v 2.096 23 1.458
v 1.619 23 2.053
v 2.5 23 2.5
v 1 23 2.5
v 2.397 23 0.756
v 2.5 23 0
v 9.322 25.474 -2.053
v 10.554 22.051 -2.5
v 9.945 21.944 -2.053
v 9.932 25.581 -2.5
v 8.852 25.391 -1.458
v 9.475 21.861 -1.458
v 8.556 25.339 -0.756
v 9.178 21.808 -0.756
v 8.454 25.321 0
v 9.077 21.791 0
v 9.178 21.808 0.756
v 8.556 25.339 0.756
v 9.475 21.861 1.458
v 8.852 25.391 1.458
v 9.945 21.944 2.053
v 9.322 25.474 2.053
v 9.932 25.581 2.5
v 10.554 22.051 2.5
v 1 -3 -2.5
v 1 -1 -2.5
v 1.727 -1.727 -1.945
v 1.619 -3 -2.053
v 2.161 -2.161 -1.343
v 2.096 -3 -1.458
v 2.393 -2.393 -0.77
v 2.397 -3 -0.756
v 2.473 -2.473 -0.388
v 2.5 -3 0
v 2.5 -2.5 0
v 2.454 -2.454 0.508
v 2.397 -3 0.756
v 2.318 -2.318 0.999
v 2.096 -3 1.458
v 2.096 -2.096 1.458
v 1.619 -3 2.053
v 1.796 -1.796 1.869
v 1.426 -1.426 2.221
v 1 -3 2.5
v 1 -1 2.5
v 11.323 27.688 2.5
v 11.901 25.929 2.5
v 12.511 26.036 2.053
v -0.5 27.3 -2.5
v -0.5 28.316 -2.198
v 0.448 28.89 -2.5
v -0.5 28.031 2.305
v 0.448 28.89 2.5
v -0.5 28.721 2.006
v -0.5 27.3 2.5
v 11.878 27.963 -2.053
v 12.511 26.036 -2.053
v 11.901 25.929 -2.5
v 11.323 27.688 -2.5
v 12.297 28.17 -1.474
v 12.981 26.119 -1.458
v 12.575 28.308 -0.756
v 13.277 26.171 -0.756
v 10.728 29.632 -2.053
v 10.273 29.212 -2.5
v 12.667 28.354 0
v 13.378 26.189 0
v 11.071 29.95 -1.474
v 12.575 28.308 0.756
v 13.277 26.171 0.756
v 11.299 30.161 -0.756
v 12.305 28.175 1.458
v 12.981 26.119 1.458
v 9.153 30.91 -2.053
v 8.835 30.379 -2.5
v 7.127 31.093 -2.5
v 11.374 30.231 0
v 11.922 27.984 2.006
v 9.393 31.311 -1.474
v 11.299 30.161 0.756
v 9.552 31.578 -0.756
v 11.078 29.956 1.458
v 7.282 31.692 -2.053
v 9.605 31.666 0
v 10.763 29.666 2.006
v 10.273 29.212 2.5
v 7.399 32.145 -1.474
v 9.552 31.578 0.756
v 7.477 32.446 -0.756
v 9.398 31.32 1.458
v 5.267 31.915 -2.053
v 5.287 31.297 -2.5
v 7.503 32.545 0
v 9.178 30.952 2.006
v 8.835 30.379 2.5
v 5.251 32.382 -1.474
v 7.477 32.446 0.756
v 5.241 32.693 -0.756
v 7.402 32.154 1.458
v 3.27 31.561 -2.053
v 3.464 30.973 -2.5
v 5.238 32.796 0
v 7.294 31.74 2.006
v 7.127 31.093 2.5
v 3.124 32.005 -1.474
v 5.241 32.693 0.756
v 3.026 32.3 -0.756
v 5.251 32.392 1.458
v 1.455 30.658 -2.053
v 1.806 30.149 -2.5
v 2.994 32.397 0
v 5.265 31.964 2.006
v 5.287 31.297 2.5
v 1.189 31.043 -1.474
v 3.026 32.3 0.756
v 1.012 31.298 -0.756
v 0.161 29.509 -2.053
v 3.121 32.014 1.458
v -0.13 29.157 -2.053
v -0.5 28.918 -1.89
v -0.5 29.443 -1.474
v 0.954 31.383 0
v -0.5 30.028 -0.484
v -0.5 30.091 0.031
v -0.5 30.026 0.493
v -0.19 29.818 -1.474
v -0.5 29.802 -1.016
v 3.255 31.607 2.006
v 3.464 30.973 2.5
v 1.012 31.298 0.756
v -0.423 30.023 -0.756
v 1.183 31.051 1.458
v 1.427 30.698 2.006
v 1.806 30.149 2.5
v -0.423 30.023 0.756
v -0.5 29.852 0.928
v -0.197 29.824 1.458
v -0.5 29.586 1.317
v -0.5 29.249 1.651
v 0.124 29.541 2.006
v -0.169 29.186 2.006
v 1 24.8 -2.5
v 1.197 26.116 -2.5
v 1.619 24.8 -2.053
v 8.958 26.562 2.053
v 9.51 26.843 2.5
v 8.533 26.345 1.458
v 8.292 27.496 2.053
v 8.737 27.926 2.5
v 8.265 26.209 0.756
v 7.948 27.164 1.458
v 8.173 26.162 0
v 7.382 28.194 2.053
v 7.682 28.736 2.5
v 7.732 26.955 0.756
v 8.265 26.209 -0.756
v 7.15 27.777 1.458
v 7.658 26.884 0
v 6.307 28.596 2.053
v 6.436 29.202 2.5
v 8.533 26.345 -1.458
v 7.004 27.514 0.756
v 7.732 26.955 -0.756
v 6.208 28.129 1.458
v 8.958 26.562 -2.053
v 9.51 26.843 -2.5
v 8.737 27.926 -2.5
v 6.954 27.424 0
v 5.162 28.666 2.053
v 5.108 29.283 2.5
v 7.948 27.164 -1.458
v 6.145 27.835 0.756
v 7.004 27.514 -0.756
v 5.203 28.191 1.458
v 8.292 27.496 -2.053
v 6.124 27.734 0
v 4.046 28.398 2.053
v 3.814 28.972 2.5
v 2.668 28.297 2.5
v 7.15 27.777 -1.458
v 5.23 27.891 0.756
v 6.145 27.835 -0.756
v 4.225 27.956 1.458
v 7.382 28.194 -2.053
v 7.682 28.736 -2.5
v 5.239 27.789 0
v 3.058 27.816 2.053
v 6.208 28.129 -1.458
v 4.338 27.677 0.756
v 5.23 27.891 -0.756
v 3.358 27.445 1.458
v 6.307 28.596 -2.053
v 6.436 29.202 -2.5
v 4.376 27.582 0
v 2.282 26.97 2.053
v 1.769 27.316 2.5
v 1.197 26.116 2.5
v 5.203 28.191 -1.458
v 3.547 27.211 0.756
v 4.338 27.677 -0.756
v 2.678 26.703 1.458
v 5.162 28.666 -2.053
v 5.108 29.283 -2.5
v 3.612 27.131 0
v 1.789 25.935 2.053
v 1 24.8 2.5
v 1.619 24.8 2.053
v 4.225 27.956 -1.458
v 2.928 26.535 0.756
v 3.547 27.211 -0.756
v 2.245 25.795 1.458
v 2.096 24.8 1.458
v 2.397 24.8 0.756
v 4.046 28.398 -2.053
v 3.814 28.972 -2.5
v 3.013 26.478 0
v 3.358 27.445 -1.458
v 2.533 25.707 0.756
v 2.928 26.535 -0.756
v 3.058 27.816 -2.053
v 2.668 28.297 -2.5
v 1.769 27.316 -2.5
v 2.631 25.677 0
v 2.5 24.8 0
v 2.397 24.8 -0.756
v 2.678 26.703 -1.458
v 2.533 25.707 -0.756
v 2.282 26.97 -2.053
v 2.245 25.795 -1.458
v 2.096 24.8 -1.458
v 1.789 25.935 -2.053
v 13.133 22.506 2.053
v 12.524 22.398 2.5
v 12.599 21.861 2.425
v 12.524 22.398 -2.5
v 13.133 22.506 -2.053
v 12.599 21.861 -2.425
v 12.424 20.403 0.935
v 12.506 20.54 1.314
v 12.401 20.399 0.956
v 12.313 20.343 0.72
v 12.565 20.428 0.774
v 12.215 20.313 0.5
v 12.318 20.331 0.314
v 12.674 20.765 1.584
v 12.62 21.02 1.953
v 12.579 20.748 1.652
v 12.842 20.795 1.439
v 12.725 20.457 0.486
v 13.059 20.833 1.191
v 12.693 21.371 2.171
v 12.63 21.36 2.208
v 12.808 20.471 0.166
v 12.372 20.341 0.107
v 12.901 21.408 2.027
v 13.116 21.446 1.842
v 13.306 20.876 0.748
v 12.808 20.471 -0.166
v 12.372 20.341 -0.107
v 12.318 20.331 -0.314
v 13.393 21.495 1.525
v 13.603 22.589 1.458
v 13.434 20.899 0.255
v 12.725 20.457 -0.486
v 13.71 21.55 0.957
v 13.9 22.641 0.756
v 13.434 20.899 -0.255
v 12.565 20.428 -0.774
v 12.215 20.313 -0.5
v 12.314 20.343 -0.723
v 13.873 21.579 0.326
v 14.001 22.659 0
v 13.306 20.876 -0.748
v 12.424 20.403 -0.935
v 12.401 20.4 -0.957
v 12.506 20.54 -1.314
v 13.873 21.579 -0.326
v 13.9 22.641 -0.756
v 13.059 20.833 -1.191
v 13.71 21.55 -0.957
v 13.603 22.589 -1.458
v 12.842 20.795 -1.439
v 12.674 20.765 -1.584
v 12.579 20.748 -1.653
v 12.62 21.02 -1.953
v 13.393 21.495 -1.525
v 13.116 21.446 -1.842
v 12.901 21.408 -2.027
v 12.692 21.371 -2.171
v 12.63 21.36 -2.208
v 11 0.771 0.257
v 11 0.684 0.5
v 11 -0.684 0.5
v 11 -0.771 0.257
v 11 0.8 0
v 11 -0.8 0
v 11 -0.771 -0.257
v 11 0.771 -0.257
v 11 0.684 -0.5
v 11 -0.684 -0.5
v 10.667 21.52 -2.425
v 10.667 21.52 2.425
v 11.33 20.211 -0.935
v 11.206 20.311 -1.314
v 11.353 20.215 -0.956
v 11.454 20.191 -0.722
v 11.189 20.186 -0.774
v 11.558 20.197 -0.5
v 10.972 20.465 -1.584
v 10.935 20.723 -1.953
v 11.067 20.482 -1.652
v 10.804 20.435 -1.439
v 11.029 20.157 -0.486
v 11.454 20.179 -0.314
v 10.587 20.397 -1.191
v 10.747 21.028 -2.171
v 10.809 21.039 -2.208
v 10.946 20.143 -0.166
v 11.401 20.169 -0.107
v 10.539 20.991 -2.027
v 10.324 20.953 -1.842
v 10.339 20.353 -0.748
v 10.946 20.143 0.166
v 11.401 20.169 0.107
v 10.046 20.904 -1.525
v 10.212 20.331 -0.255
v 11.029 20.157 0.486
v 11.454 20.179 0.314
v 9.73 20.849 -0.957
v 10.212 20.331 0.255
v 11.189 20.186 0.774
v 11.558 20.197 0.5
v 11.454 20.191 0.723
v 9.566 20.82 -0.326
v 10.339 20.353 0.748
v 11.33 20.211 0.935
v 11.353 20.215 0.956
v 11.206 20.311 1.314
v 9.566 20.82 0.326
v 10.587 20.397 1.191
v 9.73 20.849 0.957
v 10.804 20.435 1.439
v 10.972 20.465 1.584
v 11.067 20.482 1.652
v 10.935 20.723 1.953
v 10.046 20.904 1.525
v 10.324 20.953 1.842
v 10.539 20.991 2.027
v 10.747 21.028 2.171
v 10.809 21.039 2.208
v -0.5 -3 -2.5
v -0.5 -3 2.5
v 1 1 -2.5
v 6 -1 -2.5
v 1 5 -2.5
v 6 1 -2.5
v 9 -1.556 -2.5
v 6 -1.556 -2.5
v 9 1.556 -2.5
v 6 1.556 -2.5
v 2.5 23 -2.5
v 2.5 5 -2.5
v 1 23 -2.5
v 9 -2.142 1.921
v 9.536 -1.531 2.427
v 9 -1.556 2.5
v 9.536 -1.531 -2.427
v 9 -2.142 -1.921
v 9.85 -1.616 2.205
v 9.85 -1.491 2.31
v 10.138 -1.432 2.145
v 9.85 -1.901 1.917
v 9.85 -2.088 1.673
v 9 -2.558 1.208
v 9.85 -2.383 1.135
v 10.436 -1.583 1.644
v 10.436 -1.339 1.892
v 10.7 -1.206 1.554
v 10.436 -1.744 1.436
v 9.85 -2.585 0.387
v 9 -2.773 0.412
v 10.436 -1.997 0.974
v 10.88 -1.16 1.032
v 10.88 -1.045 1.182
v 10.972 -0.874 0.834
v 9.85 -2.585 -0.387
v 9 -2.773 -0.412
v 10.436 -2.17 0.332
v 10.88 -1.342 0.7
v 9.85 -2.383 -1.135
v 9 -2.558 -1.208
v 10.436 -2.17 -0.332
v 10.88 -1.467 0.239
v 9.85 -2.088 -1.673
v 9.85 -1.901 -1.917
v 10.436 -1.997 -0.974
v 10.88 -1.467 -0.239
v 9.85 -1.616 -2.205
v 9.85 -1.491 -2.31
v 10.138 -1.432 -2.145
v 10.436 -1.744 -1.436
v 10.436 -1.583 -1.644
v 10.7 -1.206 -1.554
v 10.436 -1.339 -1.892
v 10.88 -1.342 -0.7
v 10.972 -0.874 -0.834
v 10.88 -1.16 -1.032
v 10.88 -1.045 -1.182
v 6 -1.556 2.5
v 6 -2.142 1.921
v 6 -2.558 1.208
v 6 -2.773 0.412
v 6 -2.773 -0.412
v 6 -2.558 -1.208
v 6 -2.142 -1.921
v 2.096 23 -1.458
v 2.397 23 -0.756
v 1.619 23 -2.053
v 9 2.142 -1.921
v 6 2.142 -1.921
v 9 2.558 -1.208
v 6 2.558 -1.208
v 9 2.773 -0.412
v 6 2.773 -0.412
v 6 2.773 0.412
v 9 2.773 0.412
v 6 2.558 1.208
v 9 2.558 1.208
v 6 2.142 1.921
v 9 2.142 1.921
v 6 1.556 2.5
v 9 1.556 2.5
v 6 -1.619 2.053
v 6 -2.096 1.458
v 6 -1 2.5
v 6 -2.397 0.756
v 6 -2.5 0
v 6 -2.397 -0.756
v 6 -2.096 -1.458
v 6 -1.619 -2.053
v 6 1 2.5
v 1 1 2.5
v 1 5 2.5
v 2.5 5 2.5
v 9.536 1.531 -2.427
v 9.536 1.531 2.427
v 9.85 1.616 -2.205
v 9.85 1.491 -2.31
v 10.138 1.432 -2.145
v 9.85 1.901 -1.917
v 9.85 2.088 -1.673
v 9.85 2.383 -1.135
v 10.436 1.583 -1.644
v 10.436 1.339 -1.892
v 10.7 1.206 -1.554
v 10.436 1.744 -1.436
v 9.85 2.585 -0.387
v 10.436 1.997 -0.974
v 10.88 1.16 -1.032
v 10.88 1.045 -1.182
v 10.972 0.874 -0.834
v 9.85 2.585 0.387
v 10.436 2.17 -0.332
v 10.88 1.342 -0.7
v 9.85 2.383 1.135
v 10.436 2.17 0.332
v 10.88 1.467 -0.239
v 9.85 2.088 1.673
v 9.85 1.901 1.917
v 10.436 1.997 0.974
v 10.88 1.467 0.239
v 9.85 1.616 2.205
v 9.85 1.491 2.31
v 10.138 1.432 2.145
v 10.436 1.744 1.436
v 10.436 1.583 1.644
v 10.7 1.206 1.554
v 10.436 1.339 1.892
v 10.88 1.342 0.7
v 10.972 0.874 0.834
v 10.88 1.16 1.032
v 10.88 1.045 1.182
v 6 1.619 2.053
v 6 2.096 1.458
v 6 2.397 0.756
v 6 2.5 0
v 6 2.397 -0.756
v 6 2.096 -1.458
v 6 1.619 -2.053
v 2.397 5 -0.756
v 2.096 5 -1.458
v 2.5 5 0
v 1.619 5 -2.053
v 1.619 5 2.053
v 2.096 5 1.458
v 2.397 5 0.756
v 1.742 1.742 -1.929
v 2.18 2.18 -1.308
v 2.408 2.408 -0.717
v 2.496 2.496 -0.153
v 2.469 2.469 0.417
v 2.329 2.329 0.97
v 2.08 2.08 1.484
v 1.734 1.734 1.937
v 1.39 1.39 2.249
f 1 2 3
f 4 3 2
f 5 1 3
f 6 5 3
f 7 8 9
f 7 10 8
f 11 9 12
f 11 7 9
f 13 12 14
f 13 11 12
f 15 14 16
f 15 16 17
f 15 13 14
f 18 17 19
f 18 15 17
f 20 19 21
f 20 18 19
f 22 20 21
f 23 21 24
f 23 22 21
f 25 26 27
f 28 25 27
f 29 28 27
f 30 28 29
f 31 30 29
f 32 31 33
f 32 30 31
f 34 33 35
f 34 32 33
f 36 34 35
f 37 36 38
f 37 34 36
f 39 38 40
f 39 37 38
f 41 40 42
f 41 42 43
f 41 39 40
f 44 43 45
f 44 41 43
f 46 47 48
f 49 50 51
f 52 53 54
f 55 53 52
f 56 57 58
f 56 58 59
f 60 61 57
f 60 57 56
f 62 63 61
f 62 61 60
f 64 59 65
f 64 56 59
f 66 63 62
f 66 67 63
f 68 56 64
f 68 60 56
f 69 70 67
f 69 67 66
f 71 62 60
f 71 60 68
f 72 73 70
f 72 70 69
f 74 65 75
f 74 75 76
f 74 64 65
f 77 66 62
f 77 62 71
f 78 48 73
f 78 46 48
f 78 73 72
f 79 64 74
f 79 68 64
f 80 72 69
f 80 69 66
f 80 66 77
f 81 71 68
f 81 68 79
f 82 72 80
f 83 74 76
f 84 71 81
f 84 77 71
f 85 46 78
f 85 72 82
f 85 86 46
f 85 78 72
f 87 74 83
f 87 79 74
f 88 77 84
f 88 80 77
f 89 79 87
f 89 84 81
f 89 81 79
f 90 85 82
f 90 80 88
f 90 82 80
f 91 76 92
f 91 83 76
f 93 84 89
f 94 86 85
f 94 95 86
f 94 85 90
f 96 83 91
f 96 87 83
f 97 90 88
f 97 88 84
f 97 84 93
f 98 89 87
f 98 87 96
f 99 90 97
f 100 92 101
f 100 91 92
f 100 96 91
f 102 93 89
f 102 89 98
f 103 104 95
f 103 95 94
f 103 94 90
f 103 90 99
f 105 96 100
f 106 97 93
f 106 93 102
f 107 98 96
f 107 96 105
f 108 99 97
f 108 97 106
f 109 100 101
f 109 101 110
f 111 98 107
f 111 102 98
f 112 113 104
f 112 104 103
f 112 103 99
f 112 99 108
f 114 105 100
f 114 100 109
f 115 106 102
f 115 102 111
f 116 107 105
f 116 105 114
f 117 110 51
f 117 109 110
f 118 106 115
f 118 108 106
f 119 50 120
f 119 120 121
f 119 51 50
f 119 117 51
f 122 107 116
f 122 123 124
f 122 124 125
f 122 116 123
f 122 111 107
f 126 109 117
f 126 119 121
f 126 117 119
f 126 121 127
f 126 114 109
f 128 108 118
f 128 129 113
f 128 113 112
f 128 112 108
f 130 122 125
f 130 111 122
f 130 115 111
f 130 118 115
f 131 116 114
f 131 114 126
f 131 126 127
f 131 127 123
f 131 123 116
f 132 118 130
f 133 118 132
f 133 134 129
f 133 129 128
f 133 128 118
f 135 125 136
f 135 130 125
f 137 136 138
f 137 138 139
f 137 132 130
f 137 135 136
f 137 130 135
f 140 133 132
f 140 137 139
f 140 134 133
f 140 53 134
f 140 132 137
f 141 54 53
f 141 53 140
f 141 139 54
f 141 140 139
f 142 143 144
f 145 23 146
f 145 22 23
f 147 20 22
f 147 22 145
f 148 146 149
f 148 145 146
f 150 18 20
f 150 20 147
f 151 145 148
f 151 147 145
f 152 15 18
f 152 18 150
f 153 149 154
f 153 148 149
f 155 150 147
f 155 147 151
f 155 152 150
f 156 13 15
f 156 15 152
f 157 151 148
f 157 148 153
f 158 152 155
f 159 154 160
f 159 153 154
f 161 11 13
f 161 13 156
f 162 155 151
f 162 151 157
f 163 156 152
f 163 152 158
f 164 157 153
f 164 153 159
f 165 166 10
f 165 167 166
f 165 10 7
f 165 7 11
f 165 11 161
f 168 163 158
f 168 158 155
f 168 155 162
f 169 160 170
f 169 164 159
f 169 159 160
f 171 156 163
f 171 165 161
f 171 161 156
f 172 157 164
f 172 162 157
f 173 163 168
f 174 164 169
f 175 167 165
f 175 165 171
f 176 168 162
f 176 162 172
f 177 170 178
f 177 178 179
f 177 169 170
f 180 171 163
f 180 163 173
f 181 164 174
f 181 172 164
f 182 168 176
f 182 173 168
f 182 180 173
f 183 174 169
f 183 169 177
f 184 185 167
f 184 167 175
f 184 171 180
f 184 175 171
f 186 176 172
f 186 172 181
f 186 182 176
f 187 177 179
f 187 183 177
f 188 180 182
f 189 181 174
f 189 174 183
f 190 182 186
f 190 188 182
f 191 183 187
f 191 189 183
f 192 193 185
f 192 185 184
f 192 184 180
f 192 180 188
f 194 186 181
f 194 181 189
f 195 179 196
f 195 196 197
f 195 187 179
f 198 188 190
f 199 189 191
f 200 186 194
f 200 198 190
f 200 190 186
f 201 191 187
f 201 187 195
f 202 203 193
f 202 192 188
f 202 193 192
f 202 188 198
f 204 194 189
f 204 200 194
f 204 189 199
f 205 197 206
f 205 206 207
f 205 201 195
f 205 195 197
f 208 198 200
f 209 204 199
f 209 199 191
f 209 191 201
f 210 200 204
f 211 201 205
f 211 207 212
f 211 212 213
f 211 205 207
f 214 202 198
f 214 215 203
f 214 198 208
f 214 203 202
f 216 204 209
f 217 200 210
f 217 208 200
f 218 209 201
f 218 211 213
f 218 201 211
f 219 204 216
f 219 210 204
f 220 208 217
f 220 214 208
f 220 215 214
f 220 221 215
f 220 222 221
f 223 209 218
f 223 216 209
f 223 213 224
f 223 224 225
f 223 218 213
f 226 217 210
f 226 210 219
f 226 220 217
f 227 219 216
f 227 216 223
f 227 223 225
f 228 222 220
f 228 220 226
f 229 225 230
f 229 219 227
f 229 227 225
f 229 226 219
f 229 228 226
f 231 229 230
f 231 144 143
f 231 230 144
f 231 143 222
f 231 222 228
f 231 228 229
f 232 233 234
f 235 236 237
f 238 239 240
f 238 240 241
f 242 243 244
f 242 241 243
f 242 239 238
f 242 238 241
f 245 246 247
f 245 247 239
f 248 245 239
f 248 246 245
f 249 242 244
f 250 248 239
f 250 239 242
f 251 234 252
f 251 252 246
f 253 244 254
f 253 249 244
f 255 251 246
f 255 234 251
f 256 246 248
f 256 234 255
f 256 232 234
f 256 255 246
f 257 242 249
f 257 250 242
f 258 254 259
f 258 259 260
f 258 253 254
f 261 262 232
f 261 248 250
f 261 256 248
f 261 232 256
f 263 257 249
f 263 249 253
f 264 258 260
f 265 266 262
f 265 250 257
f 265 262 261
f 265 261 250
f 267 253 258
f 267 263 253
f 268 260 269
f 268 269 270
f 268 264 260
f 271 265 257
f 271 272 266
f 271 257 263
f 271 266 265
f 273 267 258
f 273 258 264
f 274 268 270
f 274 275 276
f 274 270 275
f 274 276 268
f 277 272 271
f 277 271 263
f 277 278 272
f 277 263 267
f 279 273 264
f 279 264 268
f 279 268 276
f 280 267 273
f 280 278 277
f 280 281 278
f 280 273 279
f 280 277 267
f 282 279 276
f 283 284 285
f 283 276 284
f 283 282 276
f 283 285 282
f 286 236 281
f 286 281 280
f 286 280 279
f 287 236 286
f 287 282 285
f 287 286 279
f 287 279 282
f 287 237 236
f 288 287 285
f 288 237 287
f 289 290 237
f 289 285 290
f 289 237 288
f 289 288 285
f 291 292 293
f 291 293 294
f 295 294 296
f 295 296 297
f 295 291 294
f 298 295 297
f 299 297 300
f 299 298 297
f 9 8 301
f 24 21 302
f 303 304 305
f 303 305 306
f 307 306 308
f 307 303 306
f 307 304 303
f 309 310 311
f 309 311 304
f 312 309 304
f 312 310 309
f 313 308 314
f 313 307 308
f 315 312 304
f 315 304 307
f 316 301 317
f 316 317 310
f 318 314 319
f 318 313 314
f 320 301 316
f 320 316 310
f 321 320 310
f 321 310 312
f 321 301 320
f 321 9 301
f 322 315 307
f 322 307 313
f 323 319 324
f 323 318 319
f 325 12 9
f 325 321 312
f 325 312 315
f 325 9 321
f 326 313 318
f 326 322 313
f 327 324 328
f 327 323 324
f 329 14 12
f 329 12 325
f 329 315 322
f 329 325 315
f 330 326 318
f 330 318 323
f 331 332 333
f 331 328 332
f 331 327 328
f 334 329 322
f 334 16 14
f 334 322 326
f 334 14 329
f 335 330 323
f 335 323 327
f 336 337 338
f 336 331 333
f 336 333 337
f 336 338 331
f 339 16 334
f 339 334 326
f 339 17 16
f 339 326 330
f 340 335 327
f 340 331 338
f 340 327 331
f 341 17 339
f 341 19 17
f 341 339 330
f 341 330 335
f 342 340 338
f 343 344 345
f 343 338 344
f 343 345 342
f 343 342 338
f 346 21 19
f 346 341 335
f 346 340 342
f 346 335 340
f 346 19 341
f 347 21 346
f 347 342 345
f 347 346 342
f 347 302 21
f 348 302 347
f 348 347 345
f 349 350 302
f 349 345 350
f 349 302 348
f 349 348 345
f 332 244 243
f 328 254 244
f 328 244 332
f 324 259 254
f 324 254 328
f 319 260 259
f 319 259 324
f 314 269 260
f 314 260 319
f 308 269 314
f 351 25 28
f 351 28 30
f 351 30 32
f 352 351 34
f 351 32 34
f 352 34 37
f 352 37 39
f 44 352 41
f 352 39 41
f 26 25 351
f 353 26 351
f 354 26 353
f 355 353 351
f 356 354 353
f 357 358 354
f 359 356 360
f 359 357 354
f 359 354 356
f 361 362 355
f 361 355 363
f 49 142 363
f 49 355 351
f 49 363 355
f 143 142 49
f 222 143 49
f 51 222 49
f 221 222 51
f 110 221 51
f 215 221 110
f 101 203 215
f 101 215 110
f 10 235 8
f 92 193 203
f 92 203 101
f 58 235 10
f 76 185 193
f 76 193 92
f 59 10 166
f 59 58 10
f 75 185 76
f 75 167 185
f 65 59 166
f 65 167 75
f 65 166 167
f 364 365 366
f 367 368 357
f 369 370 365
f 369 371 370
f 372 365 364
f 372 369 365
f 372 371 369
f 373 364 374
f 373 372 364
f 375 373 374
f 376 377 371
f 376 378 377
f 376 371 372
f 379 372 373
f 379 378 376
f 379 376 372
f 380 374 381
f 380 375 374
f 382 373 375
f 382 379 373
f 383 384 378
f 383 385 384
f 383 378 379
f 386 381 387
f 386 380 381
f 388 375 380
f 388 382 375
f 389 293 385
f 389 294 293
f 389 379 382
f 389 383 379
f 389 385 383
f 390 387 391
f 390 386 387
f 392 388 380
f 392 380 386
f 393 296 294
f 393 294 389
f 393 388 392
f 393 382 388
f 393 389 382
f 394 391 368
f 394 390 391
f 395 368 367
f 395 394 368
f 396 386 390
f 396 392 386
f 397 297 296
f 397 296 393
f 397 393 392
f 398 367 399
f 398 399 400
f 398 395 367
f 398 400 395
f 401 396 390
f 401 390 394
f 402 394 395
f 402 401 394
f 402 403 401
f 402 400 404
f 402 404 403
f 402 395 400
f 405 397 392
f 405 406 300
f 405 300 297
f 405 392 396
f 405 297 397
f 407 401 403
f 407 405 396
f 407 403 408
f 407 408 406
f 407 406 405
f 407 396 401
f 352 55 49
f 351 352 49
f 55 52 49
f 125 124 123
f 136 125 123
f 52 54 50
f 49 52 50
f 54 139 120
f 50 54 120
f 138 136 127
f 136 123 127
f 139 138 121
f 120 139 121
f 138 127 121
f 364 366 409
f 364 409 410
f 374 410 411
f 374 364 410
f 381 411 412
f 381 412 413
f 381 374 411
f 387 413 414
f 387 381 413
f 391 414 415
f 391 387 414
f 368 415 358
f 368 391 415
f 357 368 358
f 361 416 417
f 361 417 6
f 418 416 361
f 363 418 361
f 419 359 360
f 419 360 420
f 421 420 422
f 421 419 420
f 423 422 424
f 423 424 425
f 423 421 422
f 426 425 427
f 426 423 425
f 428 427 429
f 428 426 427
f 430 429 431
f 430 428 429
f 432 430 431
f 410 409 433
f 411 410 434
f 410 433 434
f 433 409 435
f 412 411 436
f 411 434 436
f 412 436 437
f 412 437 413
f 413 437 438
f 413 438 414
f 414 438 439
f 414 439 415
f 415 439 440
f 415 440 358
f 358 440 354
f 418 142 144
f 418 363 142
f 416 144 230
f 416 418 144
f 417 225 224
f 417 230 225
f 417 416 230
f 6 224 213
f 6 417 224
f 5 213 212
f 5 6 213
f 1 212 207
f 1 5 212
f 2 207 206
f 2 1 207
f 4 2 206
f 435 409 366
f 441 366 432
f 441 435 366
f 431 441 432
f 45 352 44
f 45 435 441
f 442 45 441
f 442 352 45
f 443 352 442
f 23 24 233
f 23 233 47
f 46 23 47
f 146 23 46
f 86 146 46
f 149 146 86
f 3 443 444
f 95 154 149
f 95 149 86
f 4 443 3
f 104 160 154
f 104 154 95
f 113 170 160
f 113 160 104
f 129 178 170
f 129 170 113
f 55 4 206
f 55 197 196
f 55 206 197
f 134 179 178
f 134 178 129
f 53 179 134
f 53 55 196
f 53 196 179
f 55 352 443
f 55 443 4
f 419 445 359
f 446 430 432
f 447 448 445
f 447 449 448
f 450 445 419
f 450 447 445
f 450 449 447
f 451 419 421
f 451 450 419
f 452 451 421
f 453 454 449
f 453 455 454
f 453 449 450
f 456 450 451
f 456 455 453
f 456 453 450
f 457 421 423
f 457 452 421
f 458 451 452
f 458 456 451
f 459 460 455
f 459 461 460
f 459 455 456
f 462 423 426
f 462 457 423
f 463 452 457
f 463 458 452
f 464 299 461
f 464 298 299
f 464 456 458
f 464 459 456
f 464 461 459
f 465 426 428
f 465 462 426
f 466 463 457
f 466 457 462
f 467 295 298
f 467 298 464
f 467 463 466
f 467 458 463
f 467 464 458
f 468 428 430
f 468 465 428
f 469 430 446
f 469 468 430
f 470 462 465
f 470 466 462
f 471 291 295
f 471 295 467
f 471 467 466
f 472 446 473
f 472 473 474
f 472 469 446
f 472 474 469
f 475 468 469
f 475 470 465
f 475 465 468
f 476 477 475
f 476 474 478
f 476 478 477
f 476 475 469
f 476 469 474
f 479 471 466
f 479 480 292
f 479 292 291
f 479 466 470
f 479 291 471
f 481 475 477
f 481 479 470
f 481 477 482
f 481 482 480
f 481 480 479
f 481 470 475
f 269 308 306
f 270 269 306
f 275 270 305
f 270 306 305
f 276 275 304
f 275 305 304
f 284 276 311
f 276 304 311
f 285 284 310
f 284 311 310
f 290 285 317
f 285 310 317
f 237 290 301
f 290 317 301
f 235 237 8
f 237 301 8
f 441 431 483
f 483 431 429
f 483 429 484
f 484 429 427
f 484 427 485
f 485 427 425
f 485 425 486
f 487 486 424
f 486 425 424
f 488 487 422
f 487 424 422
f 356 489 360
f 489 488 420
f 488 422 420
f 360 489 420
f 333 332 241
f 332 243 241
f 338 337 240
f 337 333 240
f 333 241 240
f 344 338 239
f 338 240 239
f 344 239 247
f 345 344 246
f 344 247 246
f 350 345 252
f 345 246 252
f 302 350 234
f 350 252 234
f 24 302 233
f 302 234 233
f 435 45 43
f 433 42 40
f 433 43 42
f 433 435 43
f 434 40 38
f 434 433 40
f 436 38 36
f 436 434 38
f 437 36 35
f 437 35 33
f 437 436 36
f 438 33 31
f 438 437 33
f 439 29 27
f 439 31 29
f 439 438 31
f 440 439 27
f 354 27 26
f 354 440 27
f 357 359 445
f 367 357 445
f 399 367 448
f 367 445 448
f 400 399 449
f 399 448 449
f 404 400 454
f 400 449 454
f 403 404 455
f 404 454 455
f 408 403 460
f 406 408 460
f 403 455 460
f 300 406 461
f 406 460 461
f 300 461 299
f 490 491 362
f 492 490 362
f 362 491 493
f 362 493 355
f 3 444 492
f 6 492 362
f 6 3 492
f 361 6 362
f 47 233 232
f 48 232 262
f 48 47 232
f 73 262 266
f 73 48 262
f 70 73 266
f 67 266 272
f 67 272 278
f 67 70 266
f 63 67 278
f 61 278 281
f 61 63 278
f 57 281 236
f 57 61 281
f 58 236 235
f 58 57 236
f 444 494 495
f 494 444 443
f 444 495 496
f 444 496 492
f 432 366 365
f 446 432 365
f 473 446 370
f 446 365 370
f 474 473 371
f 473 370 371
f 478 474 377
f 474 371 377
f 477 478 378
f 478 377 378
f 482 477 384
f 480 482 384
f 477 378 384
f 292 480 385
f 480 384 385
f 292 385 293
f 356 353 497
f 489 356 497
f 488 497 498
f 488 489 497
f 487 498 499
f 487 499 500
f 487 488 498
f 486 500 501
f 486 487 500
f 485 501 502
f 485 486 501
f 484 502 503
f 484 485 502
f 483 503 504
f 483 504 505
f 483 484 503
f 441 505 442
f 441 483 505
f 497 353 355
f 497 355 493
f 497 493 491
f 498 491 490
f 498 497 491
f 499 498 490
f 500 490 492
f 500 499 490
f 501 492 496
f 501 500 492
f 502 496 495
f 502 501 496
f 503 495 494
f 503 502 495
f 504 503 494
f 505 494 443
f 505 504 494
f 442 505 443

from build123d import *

# Parameters (mm, degrees)
EXTRUDE_1_DEPTH     = 5
SKETCH_19_W         = 5
SKETCH_19_H         = 18
EXTRUDE_2_DEPTH     = 1.5
FILLET_2_R          = 2
SKETCH_20_W         = 8
SKETCH_20_H         = 40
CUT_EXTRUDE_1_DEPTH = 36.961786675


with BuildPart() as part:
    # 扫描2: sweep along a path in 草图1
    with BuildLine(Plane.XY) as sweep_2_path:
        Line((11.886241035, 20.255064977), (10.916442642, 25.755064977))
        ThreePointArc((10.916442642, 25.755064977), (5.020643415, 30.27907084), (0, 24.8))
        Line((0, 24.8), (0, 0))
        Line((0, 0), (0, -3))
    # 草图13 → 扫描2 (sweep)
    with BuildSketch(Plane(origin=(0, -3, 0), x_dir=(1, 0, 0), z_dir=(0, 1, 0))):
        with BuildLine():
            Line((-1, -2.5), (1, -2.5))
            ThreePointArc((1, -2.5), (2.5, 0), (1, 2.5))
            Line((1, 2.5), (-1, 2.5))
            ThreePointArc((-1, 2.5), (-2.5, 0), (-1, -2.5))
        make_face()
    sweep(path=sweep_2_path.line)

    # 扫描4: sweep along a path in 草图15
    with BuildLine(Plane.XY) as sweep_4_path:
        Line((0, 0), (11, 0))
    # 草图16 → 扫描4 (sweep)
    with BuildSketch(Plane(origin=(11, 0, 0), x_dir=(0, 0, -1), z_dir=(1, 0, 0))):
        with BuildLine():
            Line((-2.5, -1), (-2.5, 1))
            ThreePointArc((-2.5, 1), (0, 2.5), (2.5, 1))
            Line((2.5, 1), (2.5, -1))
            ThreePointArc((2.5, -1), (0, -2.5), (-2.5, -1))
        make_face()
    sweep(path=sweep_4_path.line)

    # 草图17 → 凸台-拉伸1 (add)
    with BuildSketch(Plane(origin=(11, 0, 0), x_dir=(0, 0, -1), z_dir=(1, 0, 0))):
        with BuildLine():
            Line((-2.5, 1.555522876), (-2.5, -1.555522876))
            ThreePointArc((-2.5, -1.555522876), (0, -2.8), (2.5, -1.555522876))
            Line((2.5, -1.555522876), (2.5, 1.555522876))
            ThreePointArc((2.5, 1.555522876), (0, 2.8), (-2.5, 1.555522876))
        make_face()
    extrude(amount=-EXTRUDE_1_DEPTH)

    # 草图19 → 凸台-拉伸2 (add)
    with BuildSketch(Plane(origin=(1, 0, 0), x_dir=(0, 0, -1), z_dir=(1, 0, 0))):
        with Locations((0, 14)):
            Rectangle(SKETCH_19_W, SKETCH_19_H)
    extrude(amount=EXTRUDE_2_DEPTH)

    # 圆角2
    # the kernel refuses this fillet: 2 mm, written as the material it takes off along each edge
    with BuildSketch(Plane(origin=(17.795087554, 21.296954043, 2.5), x_dir=(0, 0, -1), z_dir=(-0.9848077530122092, -0.17364817766692373, 0))) as fillet_2_piece_1:
        with BuildLine():
            CenterArc((FILLET_2_R, -FILLET_2_R), FILLET_2_R, 90, 90)
            Line((0, -FILLET_2_R), (0, 0))
            Line((0, 0), (FILLET_2_R, 0))
        make_face()
    extrude(amount=12, mode=Mode.SUBTRACT)
    with BuildSketch(Plane(origin=(12.214510286, 20.312947703, 0), x_dir=(0.9423506208781959, 0.16616183974819204, -0.29045748456869663), z_dir=(0.2860447827236766, 0.05043741288507259, 0.9568878981667733))) as fillet_2_piece_2:
        with BuildLine():
            CenterArc((2.833333333 - FILLET_2_R, FILLET_2_R), FILLET_2_R, 270, 90)
            Line((2.833333333 - FILLET_2_R, 0), (2.833333333, 0))
            Line((2.833333333, 0), (2.833333333, FILLET_2_R))
        make_face()
    revolve(axis=Axis((12.214510286, 20.312947703, 0), (-0.173648177666923, 0.9848077530122094, 0)), revolution_arc=326.229306127, mode=Mode.SUBTRACT)
    with BuildSketch(Plane(origin=(5.977394517, 19.213175911, -2.5), x_dir=(-0.17364817766692373, 0.9848077530122092, 0), z_dir=(0.9848077530122092, 0.17364817766692373, 0))) as fillet_2_piece_3:
        with BuildLine():
            CenterArc((FILLET_2_R, FILLET_2_R), FILLET_2_R, 180, 90)
            Line((0, FILLET_2_R), (0, 0))
            Line((0, 0), (FILLET_2_R, 0))
        make_face()
    extrude(amount=12, mode=Mode.SUBTRACT)
    with BuildSketch(Plane(origin=(11, -6.555522876, 2.5), x_dir=(0, 0, -1), z_dir=(0, 1, 0))) as fillet_2_piece_4:
        with BuildLine():
            CenterArc((FILLET_2_R, FILLET_2_R), FILLET_2_R, 180, 90)
            Line((0, FILLET_2_R), (0, 0))
            Line((0, 0), (FILLET_2_R, 0))
        make_face()
    extrude(amount=13.111045751, mode=Mode.SUBTRACT)
    with BuildSketch(Plane(origin=(11, 6.555522876, -2.5), x_dir=(-1, 0, 0), z_dir=(0, -1, 0))) as fillet_2_piece_5:
        with BuildLine():
            CenterArc((FILLET_2_R, -FILLET_2_R), FILLET_2_R, 90, 90)
            Line((0, -FILLET_2_R), (0, 0))
            Line((0, 0), (FILLET_2_R, 0))
        make_face()
    extrude(amount=13.111045751, mode=Mode.SUBTRACT)
    with BuildSketch(Plane(origin=(11, -0.333333333, 0), x_dir=(0, -0.8131785022115455, -0.582014367125922), z_dir=(0, -0.582014367125922, 0.8131785022115455))) as fillet_2_piece_6:
        with BuildLine():
            CenterArc((3.133333333 - FILLET_2_R, -FILLET_2_R), FILLET_2_R, 0, 90)
            Line((3.133333333, -FILLET_2_R), (3.133333333, 0))
            Line((3.133333333, 0), (3.133333333 - FILLET_2_R, 0))
        make_face()
    revolve(axis=Axis((11, -0.333333333, 0), (1, 0, 0)), revolution_arc=288.815304863, mode=Mode.SUBTRACT)
    with BuildSketch(Plane(origin=(11, 0.333333333, 0), x_dir=(0, 0.8131785022115376, 0.5820143671259329), z_dir=(0, 0.5820143671259329, -0.8131785022115376))) as fillet_2_piece_7:
        with BuildLine():
            CenterArc((3.133333333 - FILLET_2_R, -FILLET_2_R), FILLET_2_R, 0, 90)
            Line((3.133333333 - FILLET_2_R, 0), (3.133333333, 0))
            Line((3.133333333, 0), (3.133333333, -FILLET_2_R))
        make_face()
    revolve(axis=Axis((11, 0.333333333, 0), (1, 0, 0)), revolution_arc=288.815304863, mode=Mode.SUBTRACT)
    with BuildSketch(Plane(origin=(11.557971784, 20.197182251, 0), x_dir=(-0.9423506208781961, -0.16616183974819207, 0.2904574845686964), z_dir=(-0.2860447827236764, -0.05043741288507257, -0.9568878981667737))) as fillet_2_piece_8:
        with BuildLine():
            CenterArc((2.833333333 - FILLET_2_R, FILLET_2_R), FILLET_2_R, 270, 90)
            Line((2.833333333, FILLET_2_R), (2.833333333, 0))
            Line((2.833333333, 0), (2.833333333 - FILLET_2_R, 0))
        make_face()
    revolve(axis=Axis((11.557971784, 20.197182251, 0), (-0.17364817766692306, 0.9848077530122095, 0)), revolution_arc=326.229306127, mode=Mode.SUBTRACT)

    # 草图20 → 切除-拉伸1 (cut, through all)
    with BuildSketch(Plane(origin=(-0.5, 0, 0), x_dir=(0, 0, -1), z_dir=(1, 0, 0))):
        with Locations((0, 16)):
            Rectangle(SKETCH_20_W, SKETCH_20_H)
    extrude(amount=-CUT_EXTRUDE_1_DEPTH, mode=Mode.SUBTRACT)


solid = part.part
